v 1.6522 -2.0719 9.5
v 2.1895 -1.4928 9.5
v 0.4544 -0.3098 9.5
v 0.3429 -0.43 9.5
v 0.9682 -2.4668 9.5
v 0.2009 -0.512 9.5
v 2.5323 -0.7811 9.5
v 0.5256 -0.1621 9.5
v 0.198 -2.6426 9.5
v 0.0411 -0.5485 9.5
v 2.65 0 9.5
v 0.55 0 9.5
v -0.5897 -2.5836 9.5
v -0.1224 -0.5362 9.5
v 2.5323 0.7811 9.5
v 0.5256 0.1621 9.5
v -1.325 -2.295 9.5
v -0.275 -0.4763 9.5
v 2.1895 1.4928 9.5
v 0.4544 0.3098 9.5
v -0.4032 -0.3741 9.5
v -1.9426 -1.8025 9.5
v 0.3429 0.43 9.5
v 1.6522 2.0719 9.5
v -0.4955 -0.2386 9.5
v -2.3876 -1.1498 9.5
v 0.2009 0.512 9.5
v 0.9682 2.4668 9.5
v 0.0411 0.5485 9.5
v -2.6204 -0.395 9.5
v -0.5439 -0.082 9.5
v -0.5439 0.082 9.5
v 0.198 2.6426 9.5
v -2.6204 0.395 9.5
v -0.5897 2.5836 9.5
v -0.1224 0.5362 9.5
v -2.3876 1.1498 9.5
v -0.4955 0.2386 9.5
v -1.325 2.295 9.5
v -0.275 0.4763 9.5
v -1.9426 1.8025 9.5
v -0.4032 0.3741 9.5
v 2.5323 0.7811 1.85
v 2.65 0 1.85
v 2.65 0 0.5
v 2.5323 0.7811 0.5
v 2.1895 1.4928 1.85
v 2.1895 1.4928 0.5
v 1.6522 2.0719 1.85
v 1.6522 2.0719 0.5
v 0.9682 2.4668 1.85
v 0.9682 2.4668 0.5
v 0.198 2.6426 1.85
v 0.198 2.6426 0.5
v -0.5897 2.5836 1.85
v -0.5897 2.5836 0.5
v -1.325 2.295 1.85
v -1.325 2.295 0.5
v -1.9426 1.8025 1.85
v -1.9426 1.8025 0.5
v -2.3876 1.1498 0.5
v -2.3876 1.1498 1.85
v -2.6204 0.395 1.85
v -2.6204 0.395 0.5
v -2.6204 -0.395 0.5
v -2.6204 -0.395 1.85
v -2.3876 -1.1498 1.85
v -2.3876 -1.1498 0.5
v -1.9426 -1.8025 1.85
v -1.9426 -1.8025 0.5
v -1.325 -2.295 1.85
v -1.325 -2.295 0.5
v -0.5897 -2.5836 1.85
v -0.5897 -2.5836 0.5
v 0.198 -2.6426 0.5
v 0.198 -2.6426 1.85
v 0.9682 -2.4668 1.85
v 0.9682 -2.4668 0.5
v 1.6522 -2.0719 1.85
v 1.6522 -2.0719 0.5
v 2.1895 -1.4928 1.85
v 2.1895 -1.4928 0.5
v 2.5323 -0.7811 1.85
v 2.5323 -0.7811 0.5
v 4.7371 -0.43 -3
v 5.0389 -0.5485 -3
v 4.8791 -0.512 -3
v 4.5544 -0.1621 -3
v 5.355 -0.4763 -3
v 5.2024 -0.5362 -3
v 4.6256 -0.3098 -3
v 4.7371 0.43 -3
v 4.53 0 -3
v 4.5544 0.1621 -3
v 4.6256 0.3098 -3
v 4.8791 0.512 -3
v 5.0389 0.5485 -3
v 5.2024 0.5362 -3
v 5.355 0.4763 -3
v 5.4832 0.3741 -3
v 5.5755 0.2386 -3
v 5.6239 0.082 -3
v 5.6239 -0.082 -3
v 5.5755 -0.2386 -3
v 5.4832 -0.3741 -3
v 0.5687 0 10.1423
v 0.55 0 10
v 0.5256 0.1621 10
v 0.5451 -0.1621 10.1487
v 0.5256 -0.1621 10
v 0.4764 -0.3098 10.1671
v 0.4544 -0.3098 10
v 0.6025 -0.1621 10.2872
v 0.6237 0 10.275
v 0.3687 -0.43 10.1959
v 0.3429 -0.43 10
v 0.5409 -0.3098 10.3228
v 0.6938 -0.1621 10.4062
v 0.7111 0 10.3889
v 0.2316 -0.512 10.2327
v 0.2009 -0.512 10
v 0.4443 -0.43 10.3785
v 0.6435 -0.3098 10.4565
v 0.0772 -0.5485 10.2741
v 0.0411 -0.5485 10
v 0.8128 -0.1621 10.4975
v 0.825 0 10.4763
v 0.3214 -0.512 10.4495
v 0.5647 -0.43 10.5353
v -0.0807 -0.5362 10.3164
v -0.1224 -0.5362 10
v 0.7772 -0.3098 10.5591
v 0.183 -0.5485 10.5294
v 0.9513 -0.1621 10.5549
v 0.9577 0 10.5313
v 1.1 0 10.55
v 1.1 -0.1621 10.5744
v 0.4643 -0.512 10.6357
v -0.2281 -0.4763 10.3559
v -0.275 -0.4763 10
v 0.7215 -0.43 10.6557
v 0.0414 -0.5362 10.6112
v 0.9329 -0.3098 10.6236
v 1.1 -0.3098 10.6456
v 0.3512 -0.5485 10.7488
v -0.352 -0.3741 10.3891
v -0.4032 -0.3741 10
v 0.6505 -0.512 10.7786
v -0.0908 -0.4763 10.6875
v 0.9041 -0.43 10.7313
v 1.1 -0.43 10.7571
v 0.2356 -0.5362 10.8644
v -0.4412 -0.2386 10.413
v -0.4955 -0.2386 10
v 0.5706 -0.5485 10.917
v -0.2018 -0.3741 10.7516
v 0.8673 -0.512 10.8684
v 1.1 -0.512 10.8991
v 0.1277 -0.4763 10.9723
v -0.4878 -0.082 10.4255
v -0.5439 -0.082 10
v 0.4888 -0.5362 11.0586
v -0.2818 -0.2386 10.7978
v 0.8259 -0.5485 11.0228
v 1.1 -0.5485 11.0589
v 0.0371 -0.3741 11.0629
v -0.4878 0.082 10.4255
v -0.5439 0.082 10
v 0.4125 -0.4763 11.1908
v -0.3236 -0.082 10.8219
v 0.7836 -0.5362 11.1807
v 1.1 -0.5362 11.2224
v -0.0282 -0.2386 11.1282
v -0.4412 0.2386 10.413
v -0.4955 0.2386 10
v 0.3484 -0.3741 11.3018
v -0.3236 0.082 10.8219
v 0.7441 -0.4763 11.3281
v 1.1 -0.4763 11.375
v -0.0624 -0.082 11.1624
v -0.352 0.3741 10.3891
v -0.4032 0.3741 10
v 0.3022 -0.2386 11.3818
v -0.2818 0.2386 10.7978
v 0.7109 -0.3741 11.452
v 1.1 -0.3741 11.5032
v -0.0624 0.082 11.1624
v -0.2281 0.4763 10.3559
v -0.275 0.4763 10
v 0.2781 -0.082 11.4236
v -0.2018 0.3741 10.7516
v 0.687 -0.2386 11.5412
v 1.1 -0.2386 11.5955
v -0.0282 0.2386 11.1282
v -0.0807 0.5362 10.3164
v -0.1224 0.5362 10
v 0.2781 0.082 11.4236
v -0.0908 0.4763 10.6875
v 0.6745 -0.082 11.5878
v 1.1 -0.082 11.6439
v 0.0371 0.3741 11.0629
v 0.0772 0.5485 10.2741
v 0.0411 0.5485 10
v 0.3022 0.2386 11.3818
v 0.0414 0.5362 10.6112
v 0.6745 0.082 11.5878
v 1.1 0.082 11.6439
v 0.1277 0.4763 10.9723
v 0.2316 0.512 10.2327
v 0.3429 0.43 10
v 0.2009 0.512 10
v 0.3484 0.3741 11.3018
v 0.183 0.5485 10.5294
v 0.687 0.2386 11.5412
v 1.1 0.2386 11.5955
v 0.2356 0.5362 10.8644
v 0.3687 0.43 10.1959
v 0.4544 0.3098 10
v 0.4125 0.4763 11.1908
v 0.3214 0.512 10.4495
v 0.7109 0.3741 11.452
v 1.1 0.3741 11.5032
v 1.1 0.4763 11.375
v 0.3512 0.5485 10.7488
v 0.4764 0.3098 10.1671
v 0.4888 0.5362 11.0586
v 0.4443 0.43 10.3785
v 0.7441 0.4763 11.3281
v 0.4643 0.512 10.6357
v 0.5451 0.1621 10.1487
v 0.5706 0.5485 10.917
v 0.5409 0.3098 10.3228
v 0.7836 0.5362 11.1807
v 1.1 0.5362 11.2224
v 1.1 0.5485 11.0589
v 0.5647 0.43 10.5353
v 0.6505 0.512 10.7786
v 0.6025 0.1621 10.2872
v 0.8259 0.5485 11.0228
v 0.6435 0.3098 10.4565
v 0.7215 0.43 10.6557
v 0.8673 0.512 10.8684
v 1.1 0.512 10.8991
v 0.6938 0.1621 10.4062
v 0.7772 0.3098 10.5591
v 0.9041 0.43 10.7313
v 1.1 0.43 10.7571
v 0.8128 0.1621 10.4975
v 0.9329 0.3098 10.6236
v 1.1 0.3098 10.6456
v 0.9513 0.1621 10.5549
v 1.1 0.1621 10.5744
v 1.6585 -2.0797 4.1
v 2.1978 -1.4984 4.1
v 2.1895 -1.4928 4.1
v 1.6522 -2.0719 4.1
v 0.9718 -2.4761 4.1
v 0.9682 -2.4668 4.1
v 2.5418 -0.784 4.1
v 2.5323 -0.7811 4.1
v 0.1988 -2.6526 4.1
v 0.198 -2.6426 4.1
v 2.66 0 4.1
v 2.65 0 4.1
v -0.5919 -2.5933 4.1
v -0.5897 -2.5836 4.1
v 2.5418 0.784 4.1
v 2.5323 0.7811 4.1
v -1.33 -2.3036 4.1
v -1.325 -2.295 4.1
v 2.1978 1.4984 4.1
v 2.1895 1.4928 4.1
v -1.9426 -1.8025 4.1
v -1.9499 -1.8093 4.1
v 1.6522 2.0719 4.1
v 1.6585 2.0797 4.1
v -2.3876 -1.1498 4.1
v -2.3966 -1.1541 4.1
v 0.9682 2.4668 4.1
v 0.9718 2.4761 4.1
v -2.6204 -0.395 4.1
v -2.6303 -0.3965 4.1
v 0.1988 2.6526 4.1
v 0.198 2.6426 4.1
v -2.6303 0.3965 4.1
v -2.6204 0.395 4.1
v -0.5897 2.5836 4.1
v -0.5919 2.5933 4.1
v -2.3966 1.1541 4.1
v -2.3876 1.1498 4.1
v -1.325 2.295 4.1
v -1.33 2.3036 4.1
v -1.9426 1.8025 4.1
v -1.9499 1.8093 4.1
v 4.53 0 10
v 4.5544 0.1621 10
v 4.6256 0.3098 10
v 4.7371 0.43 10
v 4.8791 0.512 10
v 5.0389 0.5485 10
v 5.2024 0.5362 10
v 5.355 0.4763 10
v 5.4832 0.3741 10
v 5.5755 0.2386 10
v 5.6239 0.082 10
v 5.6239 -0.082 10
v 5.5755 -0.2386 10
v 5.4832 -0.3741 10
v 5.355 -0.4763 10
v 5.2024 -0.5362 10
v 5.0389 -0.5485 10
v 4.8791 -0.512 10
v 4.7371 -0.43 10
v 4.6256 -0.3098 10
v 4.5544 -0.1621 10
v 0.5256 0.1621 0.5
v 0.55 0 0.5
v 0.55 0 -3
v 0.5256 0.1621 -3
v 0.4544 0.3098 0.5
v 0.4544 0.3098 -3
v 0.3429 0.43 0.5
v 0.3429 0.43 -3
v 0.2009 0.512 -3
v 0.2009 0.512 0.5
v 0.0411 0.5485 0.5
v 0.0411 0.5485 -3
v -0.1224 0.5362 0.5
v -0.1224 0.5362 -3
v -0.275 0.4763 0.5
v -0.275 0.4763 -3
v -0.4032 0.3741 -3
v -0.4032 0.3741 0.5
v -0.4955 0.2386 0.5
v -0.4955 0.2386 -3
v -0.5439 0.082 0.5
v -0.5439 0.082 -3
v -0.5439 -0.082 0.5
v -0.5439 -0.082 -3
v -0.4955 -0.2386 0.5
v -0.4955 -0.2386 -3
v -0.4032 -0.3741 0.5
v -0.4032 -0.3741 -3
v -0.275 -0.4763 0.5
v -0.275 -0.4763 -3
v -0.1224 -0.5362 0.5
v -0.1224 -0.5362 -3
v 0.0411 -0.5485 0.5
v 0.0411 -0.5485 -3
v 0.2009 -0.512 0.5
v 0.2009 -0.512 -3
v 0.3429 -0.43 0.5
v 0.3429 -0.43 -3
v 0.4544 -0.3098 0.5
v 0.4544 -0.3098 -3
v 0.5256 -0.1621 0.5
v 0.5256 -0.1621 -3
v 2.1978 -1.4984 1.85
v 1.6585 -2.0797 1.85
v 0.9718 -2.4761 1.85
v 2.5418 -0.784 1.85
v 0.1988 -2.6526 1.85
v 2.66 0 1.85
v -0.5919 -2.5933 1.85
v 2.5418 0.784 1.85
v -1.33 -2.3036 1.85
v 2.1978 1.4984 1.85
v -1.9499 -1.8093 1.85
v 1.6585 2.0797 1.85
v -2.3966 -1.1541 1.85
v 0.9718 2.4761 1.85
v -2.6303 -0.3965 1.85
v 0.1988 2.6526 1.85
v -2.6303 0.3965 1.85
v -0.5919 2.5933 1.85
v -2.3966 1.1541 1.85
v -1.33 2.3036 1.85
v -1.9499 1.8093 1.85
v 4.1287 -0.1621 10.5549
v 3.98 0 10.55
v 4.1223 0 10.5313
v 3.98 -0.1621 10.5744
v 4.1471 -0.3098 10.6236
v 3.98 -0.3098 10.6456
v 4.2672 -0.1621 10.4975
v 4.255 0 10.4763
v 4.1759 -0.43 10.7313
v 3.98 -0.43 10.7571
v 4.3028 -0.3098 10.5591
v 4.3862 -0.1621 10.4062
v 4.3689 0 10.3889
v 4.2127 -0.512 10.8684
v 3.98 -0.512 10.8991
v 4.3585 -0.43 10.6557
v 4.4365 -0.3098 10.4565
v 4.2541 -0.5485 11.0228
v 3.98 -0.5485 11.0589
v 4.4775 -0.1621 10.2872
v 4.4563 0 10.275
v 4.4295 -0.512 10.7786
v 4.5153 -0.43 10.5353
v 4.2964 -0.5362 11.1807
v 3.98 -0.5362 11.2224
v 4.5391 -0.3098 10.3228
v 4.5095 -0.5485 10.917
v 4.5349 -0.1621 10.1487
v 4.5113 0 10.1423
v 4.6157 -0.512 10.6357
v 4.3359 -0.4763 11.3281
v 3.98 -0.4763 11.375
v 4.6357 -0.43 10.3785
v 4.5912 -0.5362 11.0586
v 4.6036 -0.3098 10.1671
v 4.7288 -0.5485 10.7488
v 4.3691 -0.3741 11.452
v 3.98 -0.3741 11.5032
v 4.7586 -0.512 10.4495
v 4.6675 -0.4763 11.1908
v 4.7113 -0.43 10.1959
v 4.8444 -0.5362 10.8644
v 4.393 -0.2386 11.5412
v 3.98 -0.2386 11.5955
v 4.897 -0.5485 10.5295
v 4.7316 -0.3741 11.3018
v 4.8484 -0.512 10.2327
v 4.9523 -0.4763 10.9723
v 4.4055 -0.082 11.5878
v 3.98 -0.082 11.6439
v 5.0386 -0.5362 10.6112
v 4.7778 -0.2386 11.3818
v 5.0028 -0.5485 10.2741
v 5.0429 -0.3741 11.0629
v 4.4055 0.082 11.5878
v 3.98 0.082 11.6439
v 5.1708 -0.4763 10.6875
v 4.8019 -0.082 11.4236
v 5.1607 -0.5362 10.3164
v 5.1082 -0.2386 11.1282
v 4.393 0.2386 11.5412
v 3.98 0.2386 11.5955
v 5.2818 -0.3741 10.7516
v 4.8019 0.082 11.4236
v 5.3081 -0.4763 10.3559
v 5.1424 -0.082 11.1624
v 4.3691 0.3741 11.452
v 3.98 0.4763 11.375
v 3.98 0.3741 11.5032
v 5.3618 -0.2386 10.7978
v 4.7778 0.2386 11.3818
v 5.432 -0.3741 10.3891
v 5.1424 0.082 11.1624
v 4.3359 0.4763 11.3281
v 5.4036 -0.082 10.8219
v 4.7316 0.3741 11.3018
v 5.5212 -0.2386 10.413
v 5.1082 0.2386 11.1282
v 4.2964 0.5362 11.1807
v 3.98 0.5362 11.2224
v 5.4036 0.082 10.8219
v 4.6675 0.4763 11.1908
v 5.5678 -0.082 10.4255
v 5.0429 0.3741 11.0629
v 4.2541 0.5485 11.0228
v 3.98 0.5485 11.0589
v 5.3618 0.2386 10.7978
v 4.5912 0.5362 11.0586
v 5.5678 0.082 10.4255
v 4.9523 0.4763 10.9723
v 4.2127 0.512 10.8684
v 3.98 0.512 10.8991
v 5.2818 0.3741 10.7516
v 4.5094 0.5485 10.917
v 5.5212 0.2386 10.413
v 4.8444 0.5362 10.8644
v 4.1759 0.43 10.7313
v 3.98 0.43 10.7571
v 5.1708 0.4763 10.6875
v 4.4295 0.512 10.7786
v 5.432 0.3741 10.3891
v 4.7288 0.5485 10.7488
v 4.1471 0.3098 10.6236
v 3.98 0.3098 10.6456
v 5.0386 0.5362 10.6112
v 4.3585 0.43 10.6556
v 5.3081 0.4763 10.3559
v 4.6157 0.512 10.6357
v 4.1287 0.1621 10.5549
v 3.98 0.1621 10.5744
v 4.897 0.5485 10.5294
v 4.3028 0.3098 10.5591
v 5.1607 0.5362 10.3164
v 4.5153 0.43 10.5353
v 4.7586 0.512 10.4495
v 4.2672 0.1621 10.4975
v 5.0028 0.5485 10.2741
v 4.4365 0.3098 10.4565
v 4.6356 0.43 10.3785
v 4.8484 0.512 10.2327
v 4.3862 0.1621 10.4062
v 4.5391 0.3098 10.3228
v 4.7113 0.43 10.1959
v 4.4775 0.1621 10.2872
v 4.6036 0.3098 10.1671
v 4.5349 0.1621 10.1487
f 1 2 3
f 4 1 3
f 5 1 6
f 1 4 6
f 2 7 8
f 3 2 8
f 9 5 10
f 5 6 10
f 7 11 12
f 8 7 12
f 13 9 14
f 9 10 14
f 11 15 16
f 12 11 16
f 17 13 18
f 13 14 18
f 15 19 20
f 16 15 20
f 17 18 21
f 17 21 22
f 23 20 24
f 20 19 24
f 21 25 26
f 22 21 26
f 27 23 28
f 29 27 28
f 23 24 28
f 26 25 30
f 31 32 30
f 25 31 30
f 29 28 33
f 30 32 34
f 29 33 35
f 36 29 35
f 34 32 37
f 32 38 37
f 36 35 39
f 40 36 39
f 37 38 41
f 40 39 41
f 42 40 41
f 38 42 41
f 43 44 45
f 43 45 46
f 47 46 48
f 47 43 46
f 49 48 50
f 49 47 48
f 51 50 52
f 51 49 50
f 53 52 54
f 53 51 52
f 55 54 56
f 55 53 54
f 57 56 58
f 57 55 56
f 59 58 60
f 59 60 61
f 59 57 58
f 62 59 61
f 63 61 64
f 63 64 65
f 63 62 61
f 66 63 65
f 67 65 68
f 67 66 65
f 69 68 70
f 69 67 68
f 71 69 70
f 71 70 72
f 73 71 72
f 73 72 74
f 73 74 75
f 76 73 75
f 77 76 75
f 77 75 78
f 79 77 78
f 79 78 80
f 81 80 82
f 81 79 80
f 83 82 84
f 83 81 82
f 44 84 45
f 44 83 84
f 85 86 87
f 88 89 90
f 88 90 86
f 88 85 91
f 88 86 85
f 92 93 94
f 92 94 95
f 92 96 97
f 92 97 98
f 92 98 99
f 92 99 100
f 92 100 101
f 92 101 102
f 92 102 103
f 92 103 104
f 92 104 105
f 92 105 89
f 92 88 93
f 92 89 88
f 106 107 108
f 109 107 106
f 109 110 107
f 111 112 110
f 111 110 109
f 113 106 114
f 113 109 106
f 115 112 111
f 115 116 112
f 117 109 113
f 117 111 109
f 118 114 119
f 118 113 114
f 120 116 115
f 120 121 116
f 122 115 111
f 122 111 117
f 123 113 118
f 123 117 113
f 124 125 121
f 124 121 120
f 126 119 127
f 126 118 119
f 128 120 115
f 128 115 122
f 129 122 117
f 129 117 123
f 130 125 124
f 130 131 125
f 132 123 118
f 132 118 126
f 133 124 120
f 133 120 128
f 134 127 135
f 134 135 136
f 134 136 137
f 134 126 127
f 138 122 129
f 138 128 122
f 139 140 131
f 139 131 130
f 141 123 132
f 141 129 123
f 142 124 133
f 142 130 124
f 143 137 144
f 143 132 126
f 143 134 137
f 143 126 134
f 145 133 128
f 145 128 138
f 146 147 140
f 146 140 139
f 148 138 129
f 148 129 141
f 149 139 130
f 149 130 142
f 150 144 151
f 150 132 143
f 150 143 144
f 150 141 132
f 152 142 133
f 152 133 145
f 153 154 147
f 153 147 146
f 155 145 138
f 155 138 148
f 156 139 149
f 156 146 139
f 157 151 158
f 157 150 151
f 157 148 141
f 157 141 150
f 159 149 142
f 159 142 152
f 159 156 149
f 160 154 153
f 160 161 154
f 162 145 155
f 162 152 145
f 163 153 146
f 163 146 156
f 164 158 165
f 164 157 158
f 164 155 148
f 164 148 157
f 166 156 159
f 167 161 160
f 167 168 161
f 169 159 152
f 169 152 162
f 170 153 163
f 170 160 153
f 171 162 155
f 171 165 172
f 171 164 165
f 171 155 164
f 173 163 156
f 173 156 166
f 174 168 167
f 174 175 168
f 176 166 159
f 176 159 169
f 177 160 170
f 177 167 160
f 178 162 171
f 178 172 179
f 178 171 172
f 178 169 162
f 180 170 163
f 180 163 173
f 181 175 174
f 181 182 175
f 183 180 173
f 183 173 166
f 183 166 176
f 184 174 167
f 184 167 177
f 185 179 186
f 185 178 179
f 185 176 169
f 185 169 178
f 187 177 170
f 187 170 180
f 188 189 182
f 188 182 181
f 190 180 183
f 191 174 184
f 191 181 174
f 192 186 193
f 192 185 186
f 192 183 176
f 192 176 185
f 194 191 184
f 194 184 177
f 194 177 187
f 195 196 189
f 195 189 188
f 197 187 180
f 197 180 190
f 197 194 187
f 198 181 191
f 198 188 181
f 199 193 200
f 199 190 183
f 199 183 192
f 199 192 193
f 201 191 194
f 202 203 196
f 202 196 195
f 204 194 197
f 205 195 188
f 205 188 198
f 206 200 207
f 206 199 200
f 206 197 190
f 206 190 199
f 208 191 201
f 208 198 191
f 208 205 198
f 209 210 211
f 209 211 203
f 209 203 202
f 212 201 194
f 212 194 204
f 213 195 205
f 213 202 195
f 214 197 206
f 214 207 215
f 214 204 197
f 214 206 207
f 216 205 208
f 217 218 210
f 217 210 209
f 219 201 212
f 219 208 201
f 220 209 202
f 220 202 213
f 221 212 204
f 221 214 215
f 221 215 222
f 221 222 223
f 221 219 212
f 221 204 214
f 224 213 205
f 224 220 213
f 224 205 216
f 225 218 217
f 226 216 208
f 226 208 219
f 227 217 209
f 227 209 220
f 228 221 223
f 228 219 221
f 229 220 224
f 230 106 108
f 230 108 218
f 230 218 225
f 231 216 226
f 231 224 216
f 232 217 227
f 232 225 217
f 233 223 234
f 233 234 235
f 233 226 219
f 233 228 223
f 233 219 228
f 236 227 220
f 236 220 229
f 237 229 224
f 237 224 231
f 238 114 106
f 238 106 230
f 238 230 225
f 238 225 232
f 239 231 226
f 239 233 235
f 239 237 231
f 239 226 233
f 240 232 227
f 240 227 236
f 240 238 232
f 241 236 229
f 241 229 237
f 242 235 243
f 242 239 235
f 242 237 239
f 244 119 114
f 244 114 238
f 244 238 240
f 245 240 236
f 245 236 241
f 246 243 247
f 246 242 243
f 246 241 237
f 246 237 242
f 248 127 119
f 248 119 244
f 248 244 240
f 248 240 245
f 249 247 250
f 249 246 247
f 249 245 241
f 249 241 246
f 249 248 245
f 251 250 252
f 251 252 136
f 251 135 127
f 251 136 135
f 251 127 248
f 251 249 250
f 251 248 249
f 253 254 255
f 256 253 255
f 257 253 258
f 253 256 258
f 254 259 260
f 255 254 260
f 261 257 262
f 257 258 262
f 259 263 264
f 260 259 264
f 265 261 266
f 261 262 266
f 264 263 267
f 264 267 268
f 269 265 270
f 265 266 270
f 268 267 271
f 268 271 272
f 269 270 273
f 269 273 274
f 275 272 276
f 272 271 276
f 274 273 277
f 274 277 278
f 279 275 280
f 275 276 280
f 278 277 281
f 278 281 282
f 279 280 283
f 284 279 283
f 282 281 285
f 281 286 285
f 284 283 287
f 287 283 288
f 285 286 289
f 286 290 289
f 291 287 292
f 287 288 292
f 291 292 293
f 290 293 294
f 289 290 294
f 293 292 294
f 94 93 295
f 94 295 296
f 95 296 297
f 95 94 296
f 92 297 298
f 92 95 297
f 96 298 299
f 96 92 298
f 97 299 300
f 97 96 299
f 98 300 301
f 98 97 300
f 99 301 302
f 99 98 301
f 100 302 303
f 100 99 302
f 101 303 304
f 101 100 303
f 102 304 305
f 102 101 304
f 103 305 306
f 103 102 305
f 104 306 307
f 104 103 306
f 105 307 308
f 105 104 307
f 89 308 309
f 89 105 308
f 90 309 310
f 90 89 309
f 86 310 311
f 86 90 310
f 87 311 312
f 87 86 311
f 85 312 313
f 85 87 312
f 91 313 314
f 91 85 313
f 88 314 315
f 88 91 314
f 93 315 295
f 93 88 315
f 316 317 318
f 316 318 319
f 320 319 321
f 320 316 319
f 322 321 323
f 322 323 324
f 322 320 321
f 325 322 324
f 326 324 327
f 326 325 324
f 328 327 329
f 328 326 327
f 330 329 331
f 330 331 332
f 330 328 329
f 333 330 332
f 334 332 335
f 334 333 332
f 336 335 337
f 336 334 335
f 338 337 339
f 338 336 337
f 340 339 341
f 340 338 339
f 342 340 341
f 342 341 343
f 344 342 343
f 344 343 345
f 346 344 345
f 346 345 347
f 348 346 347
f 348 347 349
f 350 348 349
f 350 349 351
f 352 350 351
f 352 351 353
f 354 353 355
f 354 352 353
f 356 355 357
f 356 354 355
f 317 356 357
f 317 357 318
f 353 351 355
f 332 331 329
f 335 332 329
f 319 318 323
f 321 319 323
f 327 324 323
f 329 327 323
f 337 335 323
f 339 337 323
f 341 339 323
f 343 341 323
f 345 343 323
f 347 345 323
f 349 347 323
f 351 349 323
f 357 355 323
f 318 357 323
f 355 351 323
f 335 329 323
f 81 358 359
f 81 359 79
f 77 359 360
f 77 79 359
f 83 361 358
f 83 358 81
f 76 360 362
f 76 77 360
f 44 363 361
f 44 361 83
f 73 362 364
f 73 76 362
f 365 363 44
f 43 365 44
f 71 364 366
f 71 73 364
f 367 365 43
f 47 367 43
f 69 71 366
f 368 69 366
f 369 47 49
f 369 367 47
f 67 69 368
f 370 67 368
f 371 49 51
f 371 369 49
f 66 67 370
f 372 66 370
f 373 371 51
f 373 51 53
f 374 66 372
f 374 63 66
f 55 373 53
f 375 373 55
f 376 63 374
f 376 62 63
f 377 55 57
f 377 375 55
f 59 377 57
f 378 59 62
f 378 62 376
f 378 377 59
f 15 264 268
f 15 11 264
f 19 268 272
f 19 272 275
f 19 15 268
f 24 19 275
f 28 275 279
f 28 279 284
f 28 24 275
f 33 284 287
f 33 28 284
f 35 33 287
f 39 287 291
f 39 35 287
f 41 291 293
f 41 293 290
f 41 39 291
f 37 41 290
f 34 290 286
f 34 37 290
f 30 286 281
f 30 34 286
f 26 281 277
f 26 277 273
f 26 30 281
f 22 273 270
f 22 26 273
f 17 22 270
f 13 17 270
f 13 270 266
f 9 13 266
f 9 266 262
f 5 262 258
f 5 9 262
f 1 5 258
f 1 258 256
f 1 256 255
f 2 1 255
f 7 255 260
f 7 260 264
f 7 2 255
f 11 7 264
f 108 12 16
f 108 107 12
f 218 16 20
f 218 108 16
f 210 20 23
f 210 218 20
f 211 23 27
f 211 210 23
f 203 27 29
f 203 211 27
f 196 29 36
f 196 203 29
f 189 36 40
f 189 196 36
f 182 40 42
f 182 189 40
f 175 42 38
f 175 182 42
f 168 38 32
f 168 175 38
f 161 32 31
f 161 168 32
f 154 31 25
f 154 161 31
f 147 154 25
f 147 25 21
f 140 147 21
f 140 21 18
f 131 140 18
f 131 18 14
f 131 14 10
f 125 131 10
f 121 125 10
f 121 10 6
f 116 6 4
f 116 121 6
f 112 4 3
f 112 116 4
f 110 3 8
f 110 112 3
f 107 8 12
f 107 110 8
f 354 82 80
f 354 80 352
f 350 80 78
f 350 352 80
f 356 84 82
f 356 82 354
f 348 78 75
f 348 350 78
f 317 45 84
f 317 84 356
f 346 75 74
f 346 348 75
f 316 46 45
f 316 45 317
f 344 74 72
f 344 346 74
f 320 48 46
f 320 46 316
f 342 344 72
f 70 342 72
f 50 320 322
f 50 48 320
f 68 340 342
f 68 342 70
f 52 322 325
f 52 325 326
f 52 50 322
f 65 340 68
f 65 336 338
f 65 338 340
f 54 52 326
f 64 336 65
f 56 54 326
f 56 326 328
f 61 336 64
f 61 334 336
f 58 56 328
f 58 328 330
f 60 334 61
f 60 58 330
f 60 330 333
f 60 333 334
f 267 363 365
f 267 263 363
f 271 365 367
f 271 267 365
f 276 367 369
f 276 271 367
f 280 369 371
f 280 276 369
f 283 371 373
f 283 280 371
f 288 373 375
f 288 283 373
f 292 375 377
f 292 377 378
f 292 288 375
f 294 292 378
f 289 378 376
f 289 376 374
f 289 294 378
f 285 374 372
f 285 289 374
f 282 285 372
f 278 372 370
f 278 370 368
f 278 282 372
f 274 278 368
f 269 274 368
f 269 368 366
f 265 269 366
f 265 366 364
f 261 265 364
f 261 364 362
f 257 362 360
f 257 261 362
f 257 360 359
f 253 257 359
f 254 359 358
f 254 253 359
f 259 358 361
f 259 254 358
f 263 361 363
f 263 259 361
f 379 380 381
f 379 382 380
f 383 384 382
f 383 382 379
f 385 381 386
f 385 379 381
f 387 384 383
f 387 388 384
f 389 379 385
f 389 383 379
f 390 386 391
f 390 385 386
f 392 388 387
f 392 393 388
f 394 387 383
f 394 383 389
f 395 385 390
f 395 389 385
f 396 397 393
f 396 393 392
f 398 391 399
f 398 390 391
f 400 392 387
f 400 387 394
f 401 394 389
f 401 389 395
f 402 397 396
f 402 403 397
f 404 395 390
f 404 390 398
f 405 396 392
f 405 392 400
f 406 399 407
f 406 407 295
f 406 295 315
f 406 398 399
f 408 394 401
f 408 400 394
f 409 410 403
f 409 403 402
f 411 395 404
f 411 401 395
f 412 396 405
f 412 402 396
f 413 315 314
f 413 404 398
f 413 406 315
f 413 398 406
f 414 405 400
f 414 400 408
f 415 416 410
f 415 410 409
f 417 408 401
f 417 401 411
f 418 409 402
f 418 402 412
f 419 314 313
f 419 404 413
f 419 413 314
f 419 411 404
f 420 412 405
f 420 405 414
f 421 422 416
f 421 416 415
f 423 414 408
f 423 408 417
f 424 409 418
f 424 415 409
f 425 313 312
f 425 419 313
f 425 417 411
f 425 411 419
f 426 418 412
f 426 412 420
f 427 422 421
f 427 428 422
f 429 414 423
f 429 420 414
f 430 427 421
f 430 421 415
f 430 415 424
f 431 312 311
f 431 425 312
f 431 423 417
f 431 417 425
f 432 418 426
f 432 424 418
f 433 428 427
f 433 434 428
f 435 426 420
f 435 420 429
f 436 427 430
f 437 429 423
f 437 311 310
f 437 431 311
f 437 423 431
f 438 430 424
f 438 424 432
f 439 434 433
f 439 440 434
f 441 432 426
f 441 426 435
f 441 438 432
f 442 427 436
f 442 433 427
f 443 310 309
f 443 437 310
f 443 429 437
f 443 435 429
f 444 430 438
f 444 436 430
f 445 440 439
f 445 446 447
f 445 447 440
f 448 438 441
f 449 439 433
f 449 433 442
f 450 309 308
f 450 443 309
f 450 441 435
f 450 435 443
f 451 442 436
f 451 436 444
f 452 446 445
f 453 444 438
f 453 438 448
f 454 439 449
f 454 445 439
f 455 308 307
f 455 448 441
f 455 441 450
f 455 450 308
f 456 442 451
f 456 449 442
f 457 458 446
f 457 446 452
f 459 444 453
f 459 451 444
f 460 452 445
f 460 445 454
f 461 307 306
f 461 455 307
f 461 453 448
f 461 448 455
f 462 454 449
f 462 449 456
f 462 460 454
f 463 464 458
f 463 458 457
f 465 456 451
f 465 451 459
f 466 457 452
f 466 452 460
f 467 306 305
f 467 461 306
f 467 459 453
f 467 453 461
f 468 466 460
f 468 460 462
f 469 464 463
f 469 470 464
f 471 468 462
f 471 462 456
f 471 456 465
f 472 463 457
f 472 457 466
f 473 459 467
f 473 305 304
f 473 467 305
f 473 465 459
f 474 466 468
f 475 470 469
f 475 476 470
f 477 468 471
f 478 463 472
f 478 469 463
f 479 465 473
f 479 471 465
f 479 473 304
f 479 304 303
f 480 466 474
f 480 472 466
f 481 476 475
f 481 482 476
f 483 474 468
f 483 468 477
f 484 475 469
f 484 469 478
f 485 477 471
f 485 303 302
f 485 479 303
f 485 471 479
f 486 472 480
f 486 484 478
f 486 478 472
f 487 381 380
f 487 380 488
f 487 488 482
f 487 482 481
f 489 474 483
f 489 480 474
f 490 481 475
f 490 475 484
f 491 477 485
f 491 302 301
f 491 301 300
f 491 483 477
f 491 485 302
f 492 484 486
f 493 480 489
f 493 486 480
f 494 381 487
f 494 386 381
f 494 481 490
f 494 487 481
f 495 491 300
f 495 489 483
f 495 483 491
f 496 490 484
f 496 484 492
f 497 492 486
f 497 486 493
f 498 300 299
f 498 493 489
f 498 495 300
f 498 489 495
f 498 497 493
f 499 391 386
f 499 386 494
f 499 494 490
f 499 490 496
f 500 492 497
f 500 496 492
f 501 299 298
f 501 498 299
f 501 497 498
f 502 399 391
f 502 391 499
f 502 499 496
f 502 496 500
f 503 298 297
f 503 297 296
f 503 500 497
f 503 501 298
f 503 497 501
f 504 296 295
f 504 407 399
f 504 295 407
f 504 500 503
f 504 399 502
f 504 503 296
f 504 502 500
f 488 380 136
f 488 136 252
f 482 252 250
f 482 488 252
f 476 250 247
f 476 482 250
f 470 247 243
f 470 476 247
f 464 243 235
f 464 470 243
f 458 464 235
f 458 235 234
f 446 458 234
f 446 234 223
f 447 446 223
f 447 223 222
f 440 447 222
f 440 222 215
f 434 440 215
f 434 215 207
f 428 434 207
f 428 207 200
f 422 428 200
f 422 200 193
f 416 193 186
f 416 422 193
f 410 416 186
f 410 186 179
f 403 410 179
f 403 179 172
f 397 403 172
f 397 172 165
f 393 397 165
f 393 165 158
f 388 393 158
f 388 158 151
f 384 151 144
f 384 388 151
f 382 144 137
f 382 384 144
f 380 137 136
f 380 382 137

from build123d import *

# Parameters (mm, degrees)
SKETCH003_W = 2.66
SKETCH003_H = 2.25
SKETCH002_W = 2.65
SKETCH002_H = 9
SKETCH001_R = 0.55


with BuildPart() as revolution001:
    # Sketch003 → Revolution001 (revolve)
    with BuildSketch(Plane.XZ):
        with Locations((1.33, 2.975)):
            Rectangle(SKETCH003_W, SKETCH003_H)
    revolve(axis=Axis((0, 0, 0), (0, 0, 1)))


with BuildPart() as revolution:
    # Sketch002 → Revolution (revolve)
    with BuildSketch(Plane.XZ):
        with Locations((1.325, 5)):
            Rectangle(SKETCH002_W, SKETCH002_H)
    revolve(axis=Axis((0, 0, 0), (0, 0, 1)))


with BuildPart() as d_do_201ae_p5_08mm_vertical_anodeup:
    # Sweep: sweep along a path in Sketch
    with BuildLine(Plane.XZ) as sweep_path:
        Line((0, -3), (0, 10))
        ThreePointArc((0, 10), (0.322183, 10.777817), (1.1, 11.1))
        Line((1.1, 11.1), (3.98, 11.1))
        ThreePointArc((3.98, 11.1), (4.757817, 10.777817), (5.08, 10))
        Line((5.08, 10), (5.08, -3))
    # Sketch001 → Sweep (sweep)
    with BuildSketch(Plane.XY):
        Circle(SKETCH001_R)
    sweep(path=sweep_path.line)

    # Sweep_mp_cp: union Revolution001, Revolution
    add(revolution001.part)
    add(revolution.part)


solid = d_do_201ae_p5_08mm_vertical_anodeup.part
